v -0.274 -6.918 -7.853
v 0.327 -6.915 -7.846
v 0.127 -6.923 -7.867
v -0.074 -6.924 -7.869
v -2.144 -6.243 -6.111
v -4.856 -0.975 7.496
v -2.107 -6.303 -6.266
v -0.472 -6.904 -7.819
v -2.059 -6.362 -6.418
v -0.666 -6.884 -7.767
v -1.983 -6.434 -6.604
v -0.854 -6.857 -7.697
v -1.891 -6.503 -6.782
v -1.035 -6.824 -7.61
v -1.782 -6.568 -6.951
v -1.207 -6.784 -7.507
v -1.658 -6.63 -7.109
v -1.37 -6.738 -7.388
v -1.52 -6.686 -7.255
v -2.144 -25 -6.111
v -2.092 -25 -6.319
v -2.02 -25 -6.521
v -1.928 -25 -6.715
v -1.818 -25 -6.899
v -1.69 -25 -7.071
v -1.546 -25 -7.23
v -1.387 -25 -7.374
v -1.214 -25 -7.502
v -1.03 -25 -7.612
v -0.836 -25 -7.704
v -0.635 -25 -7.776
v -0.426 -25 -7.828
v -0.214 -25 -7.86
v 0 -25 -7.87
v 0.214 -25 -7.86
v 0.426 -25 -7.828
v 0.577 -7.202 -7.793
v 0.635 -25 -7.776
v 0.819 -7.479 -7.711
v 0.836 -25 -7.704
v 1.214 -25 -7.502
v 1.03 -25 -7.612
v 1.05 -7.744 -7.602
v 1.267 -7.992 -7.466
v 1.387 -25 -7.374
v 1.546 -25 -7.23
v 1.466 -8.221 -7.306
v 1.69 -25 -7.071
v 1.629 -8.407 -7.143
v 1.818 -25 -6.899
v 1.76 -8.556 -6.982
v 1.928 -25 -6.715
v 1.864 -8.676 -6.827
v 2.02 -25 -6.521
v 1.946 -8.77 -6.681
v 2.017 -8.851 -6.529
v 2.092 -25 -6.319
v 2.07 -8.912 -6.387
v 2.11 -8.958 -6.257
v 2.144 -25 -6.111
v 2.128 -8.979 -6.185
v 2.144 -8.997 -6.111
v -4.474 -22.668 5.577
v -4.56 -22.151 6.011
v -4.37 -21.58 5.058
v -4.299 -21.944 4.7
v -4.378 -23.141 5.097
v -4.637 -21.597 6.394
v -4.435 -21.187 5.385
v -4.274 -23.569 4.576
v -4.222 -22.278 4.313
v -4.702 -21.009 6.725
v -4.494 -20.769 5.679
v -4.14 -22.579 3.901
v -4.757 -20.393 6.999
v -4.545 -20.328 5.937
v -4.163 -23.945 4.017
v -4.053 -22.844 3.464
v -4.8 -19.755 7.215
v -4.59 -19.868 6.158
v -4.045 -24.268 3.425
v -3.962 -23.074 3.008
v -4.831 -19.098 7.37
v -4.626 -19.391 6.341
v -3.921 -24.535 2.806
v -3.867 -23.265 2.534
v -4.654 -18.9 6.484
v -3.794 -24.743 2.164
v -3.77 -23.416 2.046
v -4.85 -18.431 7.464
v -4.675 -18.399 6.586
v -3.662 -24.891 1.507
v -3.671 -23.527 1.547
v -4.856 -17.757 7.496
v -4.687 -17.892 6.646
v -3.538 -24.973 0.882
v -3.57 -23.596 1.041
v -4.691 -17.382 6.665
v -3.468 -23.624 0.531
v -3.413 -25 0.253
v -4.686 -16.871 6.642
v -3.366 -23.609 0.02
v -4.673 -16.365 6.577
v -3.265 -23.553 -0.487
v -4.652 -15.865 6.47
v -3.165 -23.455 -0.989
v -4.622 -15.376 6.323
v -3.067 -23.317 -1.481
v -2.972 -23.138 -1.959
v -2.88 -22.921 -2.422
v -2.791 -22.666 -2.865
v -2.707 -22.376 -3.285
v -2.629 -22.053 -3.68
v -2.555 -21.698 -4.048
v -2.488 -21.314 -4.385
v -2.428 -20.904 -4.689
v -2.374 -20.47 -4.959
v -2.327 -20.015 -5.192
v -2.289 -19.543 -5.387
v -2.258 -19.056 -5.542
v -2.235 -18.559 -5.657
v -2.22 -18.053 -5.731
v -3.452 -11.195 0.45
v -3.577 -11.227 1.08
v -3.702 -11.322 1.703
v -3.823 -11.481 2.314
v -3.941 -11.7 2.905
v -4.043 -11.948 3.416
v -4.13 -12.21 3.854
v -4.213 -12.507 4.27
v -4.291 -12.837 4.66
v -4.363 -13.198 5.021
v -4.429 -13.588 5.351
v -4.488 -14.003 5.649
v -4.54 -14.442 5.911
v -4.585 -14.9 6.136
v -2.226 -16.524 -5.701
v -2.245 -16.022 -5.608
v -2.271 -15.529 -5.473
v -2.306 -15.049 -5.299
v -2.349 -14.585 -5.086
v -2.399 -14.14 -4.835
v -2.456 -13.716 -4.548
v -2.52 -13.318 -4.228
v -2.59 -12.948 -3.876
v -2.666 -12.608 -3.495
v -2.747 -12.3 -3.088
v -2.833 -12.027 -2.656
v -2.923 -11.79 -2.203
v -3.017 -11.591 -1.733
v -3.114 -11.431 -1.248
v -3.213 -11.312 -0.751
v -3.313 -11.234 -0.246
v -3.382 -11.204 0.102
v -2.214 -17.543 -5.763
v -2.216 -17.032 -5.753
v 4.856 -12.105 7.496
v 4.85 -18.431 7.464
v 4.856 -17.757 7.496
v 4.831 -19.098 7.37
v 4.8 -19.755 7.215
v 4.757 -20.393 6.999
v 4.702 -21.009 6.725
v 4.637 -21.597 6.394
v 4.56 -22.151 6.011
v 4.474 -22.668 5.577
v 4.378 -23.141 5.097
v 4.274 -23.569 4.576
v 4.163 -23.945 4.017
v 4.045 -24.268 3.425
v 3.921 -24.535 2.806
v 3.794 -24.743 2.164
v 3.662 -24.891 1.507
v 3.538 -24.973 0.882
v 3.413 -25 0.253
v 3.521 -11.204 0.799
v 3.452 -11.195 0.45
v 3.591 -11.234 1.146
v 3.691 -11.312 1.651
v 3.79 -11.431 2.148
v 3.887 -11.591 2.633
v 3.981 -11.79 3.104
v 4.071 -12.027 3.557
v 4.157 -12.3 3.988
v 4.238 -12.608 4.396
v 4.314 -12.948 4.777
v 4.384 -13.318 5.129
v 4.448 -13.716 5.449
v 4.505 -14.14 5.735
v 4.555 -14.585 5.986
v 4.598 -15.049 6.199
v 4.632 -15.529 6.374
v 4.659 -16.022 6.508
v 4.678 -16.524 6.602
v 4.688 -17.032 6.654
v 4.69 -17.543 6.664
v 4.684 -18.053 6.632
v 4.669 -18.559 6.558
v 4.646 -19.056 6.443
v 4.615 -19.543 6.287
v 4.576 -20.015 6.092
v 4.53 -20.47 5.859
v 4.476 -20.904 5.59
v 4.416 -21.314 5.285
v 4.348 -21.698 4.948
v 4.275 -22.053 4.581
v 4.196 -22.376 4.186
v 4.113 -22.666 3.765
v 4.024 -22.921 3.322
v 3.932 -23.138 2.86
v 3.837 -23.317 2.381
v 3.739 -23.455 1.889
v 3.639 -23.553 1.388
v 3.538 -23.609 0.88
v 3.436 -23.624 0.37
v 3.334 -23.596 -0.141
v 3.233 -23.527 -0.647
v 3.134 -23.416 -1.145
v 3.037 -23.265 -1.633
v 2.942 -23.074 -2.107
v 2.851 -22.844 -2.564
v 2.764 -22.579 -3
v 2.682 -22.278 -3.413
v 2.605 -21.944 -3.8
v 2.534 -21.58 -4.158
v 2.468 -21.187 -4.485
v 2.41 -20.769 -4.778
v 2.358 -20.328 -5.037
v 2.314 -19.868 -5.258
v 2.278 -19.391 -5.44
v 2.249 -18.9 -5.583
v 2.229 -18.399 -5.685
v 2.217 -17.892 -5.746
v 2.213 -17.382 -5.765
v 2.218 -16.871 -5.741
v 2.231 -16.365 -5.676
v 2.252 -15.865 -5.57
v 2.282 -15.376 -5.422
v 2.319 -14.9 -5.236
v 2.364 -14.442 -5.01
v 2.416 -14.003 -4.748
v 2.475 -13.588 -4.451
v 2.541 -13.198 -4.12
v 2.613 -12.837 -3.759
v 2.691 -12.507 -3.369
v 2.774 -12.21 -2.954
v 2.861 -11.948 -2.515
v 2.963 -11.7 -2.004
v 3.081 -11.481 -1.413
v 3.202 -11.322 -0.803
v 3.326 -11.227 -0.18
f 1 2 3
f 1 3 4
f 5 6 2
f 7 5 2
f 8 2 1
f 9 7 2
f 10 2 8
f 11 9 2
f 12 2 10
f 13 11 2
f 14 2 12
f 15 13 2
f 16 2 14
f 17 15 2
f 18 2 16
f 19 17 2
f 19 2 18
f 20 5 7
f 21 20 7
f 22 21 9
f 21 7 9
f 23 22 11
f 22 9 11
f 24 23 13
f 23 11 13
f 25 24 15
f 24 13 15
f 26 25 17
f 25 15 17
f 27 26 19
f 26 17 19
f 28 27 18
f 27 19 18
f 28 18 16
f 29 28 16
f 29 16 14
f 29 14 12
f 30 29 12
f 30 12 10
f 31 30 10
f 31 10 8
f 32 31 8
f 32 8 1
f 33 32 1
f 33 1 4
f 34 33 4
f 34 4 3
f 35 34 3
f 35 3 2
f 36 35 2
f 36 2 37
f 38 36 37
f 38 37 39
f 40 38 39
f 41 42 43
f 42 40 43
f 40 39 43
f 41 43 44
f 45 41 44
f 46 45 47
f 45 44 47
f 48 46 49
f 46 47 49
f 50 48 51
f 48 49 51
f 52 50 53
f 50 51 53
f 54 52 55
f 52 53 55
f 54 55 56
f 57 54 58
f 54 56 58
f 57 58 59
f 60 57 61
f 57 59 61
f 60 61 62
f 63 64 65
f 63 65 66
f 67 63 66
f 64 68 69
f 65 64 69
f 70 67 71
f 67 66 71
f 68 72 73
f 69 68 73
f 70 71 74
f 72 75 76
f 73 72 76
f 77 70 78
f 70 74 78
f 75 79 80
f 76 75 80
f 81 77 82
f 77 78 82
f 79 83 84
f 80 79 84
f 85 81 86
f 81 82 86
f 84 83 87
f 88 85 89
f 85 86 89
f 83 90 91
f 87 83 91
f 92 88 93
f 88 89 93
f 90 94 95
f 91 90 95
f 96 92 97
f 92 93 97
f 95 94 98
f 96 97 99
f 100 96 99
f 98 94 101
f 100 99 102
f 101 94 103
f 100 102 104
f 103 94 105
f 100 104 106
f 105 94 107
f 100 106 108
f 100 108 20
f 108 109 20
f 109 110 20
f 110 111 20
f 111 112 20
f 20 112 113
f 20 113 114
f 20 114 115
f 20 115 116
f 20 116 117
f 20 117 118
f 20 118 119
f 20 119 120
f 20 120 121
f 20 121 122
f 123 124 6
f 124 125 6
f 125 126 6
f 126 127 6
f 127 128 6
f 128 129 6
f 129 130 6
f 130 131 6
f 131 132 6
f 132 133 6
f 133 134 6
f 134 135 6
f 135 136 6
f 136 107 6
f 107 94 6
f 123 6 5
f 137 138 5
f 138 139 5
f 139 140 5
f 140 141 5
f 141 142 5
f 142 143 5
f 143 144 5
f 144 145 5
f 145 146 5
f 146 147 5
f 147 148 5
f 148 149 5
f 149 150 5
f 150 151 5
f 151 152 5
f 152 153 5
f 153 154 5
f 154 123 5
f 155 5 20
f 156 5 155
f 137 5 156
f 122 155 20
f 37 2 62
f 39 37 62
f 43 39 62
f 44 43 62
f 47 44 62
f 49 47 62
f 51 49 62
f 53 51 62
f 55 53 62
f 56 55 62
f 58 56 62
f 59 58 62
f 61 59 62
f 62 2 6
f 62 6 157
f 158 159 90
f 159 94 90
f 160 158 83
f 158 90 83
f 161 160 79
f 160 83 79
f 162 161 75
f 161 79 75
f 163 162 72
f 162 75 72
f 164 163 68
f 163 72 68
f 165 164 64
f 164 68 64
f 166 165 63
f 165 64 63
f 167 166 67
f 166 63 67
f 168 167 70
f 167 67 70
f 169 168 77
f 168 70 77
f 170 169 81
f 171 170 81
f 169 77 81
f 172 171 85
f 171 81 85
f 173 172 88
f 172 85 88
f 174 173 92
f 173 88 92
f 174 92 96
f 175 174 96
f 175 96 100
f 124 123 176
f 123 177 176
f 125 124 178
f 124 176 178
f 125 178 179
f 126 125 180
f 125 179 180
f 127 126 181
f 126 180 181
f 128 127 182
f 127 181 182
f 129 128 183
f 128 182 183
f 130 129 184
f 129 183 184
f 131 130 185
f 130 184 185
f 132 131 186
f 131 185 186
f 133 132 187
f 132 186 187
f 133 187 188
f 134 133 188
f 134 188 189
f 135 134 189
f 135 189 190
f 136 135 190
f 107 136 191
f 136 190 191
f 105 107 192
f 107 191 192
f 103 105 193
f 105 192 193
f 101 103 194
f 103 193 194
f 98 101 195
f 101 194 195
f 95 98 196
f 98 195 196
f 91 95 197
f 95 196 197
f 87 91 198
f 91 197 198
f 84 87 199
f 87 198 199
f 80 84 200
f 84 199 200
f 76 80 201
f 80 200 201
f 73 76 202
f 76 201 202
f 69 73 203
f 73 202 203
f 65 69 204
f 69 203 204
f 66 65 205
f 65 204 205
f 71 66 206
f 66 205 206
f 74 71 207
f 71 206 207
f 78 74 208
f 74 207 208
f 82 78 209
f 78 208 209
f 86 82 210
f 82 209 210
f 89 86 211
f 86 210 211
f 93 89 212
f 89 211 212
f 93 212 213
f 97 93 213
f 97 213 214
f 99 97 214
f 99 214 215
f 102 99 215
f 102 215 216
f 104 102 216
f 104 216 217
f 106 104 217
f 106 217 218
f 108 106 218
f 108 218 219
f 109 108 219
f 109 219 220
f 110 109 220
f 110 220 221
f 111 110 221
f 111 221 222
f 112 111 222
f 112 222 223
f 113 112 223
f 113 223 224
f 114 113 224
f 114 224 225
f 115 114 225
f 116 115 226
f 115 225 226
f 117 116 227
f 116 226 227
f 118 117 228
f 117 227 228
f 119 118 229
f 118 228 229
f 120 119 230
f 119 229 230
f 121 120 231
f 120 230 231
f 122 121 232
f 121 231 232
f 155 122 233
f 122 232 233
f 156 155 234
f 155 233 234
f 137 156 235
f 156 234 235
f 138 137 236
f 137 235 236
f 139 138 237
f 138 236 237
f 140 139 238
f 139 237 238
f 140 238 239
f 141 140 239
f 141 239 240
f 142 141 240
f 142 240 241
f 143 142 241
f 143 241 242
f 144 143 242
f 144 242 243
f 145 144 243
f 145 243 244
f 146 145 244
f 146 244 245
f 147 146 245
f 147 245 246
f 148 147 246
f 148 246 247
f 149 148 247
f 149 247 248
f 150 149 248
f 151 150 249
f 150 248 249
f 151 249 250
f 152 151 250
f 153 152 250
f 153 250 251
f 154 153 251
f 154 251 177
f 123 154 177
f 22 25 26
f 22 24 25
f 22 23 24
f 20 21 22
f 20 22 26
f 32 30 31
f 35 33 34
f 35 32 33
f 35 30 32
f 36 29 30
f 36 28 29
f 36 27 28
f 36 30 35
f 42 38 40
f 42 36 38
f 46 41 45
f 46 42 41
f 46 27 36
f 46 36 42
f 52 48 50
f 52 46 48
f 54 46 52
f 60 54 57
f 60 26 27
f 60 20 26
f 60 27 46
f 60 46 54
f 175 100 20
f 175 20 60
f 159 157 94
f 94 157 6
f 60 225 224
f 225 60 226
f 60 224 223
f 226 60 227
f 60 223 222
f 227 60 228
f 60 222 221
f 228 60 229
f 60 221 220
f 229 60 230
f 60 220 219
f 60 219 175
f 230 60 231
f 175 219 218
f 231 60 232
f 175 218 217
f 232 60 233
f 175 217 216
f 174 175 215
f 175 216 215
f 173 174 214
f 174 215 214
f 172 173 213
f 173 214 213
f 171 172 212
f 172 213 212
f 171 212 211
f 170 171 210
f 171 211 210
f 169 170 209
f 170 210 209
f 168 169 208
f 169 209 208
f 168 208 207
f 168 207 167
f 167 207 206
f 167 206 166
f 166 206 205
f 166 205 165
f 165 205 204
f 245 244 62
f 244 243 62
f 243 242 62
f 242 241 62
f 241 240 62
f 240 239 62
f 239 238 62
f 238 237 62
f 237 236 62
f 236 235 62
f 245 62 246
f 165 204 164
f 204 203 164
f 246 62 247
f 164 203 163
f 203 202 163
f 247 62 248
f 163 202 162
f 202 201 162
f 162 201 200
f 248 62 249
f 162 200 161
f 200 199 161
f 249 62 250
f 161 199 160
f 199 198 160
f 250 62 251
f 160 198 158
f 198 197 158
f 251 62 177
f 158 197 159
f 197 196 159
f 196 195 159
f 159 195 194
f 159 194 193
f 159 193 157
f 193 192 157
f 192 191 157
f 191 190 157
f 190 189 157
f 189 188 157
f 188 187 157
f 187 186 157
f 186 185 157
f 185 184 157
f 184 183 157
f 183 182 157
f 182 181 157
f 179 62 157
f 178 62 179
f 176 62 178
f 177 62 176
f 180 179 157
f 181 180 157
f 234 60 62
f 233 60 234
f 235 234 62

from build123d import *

# Parameters (mm, degrees)
F1_DEPTH      = 25
F2_T1_DEPTH   = 79.8532648187
F4_DEPTH      = 25
F4_DEPTH_BACK = 25
F5_T1_DEPTH   = 107.1220330496
F7_DEPTH      = 25
F8_R          = 6.2148490945
F9_DEPTH      = 25
F9_DEPTH_BACK = 25
F10_R         = 7.2426406871


# Not quite as in the source:
# - a fillet or chamfer that OpenCascade refuses, or shapes differently, is made with other operations: its cross-section is extruded or revolved along the edge and cut away or added


with BuildPart() as f1:
    # F0 (on Front) → F1 (new body)
    with BuildSketch(Plane.XZ):
        Polygon((4.8560337164, 7.4956272729), (0, 7.4956272729), (-4.8560337164, 7.4956272729), (0, -16.87037386), align=None)
    extrude(amount=F1_DEPTH)

    # F2: fillet of radius 2.1864014695 on 1 edges, made by hand

    # F2_s2 → F2_t1 (cut)
    with BuildSketch(Plane.XZ.offset(-27.4266324093)):
        with BuildLine():
            ThreePointArc((-2.1442330518, -6.1113083304), (0, -7.87037386), (2.1442330518, -6.1113083304))
            Line((2.1442330518, -6.1113083304), (0, -16.87037386))
            Line((0, -16.87037386), (-2.1442330518, -6.1113083304))
        make_face()
    extrude(amount=F2_T1_DEPTH, mode=Mode.SUBTRACT)

    # F3 (on Right) → F4 (cut, two sides)
    with BuildSketch(Plane.YZ) as f4_sk:
        with BuildLine():
            ThreePointArc((1.5301647967, 9.1992565168), (-4.4063240448, -7.9303751627), (-16.6751330548, -21.2773788233))
            Line((-16.6751330548, -21.2773788233), (1.5301647967, -21.2773788233))
            Line((1.5301647967, -21.2773788233), (1.5301647967, 9.1992565168))
        make_face()
    extrude(amount=-F4_DEPTH, mode=Mode.SUBTRACT)
    extrude(f4_sk.sketch, amount=F4_DEPTH_BACK, mode=Mode.SUBTRACT)

    # F5: chamfer of 5.5 on 1 edges, made by hand

    # F5_s2 → F5_t1 (cut)
    with BuildSketch(Plane.YZ.offset(-53.5610165248)):
        with BuildLine():
            Line((0.079428002, 10.2204041802), (-9.7965992647, -15.2892315683))
            Line((-9.7965992647, -15.2892315683), (-9.7152756624, -15.3633022893))
            ThreePointArc((-9.7152756624, -15.3633022893), (-3.8594523105, -7.2118040219), (0.1053121044, 2.0189976591))
            Line((0.1053121044, 2.0189976591), (0.11, 2.0507680961))
            ThreePointArc((0.11, 2.0507680961), (0.11, 6.1355861381), (0.189428002, 10.2204041802))
            Line((0.189428002, 10.2204041802), (0.079428002, 10.2204041802))
        make_face()
    extrude(amount=F5_T1_DEPTH, mode=Mode.SUBTRACT)

    # F6 (on face) → F7 (cut)
    with BuildSketch(Plane.XY.offset(7.4956272729)):
        Polygon((7.9051312059, 6.1967439927), (-4.8560337164, -0.9754663641), (7.9051312059, -15.5989079942), align=None)
    extrude(amount=-F7_DEPTH, mode=Mode.SUBTRACT)

    # F8 (on Right) → F9 (cut, two sides)
    with BuildSketch(Plane.YZ) as f9_sk:
        with Locations((-17.4094103277, 0.4502551164)):
            Circle(F8_R)
    extrude(amount=F9_DEPTH, mode=Mode.SUBTRACT)
    extrude(f9_sk.sketch, amount=-F9_DEPTH_BACK, mode=Mode.SUBTRACT)

    # F10
    f10_edges = [f1.edges().sort_by_distance(p)[0] for p in [
        (0, -25, 7.495627),
    ]]
    fillet(f10_edges, radius=F10_R)


solid = f1.part
